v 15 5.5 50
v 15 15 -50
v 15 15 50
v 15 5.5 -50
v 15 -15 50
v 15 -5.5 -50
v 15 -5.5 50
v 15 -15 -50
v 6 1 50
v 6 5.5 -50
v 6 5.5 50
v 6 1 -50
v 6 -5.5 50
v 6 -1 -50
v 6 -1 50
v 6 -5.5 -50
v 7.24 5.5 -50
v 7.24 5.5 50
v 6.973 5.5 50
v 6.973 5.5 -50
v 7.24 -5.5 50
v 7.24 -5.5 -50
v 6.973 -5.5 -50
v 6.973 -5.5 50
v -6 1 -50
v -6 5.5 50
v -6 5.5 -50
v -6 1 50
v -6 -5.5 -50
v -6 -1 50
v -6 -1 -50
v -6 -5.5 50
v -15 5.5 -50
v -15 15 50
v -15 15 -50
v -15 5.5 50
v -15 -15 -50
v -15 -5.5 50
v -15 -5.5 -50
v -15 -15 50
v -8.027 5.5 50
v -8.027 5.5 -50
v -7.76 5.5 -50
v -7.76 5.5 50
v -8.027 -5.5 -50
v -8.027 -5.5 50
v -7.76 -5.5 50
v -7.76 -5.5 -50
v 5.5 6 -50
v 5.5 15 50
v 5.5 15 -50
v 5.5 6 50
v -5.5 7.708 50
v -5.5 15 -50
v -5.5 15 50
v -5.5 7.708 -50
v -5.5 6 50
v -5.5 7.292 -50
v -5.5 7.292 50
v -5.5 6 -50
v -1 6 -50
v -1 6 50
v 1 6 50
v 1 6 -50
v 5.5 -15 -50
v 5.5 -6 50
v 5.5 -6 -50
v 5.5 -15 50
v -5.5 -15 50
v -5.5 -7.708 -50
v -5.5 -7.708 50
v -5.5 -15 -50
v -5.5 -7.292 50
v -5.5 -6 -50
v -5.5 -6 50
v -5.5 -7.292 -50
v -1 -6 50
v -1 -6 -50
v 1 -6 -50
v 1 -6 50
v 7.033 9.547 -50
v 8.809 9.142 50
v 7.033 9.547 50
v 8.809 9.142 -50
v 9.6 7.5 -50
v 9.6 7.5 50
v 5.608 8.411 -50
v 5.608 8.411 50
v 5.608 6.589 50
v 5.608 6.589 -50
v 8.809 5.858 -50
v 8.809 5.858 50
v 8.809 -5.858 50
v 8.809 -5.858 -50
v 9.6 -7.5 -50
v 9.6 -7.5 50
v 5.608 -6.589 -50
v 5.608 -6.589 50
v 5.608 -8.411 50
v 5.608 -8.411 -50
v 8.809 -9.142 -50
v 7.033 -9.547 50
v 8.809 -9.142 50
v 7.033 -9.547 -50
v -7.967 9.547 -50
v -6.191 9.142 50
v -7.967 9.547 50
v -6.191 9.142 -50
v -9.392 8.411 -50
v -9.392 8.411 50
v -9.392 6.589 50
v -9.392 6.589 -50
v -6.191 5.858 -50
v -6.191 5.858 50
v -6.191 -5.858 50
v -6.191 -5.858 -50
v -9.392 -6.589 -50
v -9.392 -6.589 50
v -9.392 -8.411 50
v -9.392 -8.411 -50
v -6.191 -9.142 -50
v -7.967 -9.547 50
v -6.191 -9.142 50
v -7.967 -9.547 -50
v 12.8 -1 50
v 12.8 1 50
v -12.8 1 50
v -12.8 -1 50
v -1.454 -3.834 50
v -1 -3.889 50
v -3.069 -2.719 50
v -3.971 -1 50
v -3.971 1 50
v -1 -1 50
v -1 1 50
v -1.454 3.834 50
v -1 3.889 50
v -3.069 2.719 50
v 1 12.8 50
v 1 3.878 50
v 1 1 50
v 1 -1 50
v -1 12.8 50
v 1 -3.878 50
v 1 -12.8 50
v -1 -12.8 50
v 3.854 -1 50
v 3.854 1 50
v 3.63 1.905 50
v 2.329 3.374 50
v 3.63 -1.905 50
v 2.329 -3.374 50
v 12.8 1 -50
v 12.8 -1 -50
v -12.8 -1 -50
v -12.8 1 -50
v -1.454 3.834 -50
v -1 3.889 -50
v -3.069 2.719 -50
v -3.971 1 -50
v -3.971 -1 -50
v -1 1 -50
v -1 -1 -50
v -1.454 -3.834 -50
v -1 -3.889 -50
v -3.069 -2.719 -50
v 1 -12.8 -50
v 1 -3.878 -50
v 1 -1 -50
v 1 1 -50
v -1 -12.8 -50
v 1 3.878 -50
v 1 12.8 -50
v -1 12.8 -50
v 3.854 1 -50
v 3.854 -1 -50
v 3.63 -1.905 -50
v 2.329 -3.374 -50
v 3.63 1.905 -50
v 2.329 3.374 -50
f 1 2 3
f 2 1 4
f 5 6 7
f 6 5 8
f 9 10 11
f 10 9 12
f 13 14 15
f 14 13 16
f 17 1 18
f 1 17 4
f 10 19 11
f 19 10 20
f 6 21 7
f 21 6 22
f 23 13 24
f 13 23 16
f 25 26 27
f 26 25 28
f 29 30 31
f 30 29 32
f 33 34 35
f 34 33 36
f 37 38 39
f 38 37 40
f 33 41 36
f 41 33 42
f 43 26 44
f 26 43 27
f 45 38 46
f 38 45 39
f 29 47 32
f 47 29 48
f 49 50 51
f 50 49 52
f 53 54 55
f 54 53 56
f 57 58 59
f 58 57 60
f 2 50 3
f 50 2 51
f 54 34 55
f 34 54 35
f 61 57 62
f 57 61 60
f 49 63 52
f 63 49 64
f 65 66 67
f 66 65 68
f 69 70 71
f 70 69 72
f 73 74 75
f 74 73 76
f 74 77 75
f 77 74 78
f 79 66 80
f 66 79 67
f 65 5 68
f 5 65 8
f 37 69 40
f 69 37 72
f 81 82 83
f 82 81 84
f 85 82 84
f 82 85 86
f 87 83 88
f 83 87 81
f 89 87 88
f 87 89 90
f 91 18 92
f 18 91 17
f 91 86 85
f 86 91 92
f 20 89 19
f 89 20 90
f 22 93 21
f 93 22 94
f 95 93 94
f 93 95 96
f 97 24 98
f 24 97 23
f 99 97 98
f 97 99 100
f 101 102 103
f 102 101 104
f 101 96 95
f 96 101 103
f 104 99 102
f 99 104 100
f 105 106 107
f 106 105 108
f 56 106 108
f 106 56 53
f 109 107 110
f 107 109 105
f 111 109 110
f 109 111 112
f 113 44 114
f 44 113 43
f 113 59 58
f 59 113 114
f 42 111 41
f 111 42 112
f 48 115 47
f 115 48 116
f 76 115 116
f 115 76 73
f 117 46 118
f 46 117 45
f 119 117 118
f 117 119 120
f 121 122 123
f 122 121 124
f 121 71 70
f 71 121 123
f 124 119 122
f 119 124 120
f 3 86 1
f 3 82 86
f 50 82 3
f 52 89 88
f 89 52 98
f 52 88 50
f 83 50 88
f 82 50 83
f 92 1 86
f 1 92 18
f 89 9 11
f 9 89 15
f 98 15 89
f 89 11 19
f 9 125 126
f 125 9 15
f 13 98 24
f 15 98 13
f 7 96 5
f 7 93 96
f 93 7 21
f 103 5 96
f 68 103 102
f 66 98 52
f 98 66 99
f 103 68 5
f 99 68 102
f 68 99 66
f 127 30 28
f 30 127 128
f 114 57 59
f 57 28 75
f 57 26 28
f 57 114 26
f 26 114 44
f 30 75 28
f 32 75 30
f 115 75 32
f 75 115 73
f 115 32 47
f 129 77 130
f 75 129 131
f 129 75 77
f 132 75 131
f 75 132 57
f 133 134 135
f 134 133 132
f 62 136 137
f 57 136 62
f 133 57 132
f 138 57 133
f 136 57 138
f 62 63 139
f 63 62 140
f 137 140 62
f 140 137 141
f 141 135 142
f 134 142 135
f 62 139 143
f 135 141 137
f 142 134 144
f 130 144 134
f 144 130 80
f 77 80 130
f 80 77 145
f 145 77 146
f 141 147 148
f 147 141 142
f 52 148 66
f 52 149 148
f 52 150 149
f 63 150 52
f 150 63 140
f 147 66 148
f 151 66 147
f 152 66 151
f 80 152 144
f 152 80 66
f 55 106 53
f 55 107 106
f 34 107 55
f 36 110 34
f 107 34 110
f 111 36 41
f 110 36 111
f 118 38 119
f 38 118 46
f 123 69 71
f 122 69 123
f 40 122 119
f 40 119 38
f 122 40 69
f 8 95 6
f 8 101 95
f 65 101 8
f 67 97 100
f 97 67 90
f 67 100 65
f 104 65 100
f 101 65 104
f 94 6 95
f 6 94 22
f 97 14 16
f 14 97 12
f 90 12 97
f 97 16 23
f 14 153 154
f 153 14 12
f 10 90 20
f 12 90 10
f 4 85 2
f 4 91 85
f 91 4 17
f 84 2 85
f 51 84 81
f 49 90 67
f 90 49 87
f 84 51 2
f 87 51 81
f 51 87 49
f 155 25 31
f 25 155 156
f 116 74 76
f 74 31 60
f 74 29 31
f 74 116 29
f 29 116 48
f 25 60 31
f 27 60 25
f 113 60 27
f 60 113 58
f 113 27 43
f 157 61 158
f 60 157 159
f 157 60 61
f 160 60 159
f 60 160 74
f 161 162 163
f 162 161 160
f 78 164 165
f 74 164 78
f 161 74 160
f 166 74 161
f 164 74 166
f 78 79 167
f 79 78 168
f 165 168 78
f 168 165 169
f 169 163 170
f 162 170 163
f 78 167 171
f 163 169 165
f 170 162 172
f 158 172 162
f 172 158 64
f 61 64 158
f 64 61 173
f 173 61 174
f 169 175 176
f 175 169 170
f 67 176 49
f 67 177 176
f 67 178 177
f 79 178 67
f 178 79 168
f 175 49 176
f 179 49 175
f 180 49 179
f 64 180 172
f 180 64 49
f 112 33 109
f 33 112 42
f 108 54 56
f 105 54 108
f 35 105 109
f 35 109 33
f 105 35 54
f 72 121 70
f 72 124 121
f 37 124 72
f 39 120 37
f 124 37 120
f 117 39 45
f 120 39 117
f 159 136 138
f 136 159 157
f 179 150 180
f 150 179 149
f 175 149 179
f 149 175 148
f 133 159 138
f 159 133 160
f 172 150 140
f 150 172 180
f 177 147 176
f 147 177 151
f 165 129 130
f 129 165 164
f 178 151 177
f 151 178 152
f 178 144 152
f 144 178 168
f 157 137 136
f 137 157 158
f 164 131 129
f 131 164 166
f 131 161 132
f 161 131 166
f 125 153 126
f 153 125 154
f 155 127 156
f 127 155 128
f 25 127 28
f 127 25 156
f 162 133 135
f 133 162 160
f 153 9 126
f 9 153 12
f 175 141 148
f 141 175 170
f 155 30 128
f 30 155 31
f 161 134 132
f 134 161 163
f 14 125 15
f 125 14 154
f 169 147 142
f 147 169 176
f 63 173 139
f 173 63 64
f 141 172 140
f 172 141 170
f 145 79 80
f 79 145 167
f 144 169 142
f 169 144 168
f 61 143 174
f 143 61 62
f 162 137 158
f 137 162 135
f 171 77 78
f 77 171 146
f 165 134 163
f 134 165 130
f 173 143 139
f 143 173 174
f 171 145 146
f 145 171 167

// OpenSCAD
// Parameters
profile_width = 30; //[15:60:1]
profile_height = 30; //[15:60:1]
length = 100; //[50:200:1]
center = 1; //[0:1:1]
cornerHole = 1; //[0:1:1]
wall_thickness = 2.2; //[1.1:4.4:0.1]
slot_opening = 6.2; //[3.1:12.4:0.1]
slot_cavity_width = 11.0; //[5.5:22.0:0.1]
slot_depth = 8.0; //[4.0:16.0:0.1]
center_bore_diameter = 8.2; //[4.1:16.4:0.1]
web_thickness = 2.0; //[1.0:4.0:0.1]
corner_hole_diameter = 4.2; //[2.1:8.4:0.1]
corner_hole_inset = 7.5; //[3.75:15.0:0.1]
overlap = 1.0; //[0.5:2.0:0.1]

// Extrusion - complete detailed geometry
module extrusion() {
  color("Silver") {
    difference() {
      // Main body
      translate([0, 0, center*(0) + (1-center)*(length/2)])
        cube([profile_width, profile_height, length], center=true);
      
      // T-slot channels
      union() {
        translate([profile_width/2 - (slot_depth + overlap)/2, 0, center*(0) + (1-center)*(length/2)])
          cube([slot_depth + overlap, slot_cavity_width, length + 2*overlap], center=true);
        translate([-profile_width/2 + (slot_depth + overlap)/2, 0, center*(0) + (1-center)*(length/2)])
          cube([slot_depth + overlap, slot_cavity_width, length + 2*overlap], center=true);
        translate([0, profile_height/2 - (slot_depth + overlap)/2, center*(0) + (1-center)*(length/2)])
          cube([slot_cavity_width, slot_depth + overlap, length + 2*overlap], center=true);
        translate([0, -profile_height/2 + (slot_depth + overlap)/2, center*(0) + (1-center)*(length/2)])
          cube([slot_cavity_width, slot_depth + overlap, length + 2*overlap], center=true);
      }
      
      // T-slot mouths
      union() {
        translate([profile_width/2 - (slot_depth + overlap)/2, 0, center*(0) + (1-center)*(length/2)])
          cube([slot_depth + overlap, slot_opening, length + 2*overlap], center=true);
        translate([-profile_width/2 + (slot_depth + overlap)/2, 0, center*(0) + (1-center)*(length/2)])
          cube([slot_depth + overlap, slot_opening, length + 2*overlap], center=true);
        translate([0, profile_height/2 - (slot_depth + overlap)/2, center*(0) + (1-center)*(length/2)])
          cube([slot_opening, slot_depth + overlap, length + 2*overlap], center=true);
        translate([0, -profile_height/2 + (slot_depth + overlap)/2, center*(0) + (1-center)*(length/2)])
          cube([slot_opening, slot_depth + overlap, length + 2*overlap], center=true);
      }
      
      // Center bore
      translate([0, 0, center*(0) + (1-center)*(length/2)])
        cylinder(r=center_bore_diameter/2, h=length + 2*overlap, center=true);
      
      // Corner holes
      if (cornerHole) {
        union() {
          translate([profile_width/2 - corner_hole_inset, profile_height/2 - corner_hole_inset, center*(0) + (1-center)*(length/2)])
            cylinder(r=corner_hole_diameter/2, h=length + 2*overlap, center=true);
          translate([profile_width/2 - corner_hole_inset, -profile_height/2 + corner_hole_inset, center*(0) + (1-center)*(length/2)])
            cylinder(r=corner_hole_diameter/2, h=length + 2*overlap, center=true);
          translate([-profile_width/2 + corner_hole_inset, profile_height/2 - corner_hole_inset, center*(0) + (1-center)*(length/2)])
            cylinder(r=corner_hole_diameter/2, h=length + 2*overlap, center=true);
          translate([-profile_width/2 + corner_hole_inset, -profile_height/2 + corner_hole_inset, center*(0) + (1-center)*(length/2)])
            cylinder(r=corner_hole_diameter/2, h=length + 2*overlap, center=true);
        }
      }
    }
  }
}

// Extrusion Cross Section - complete detailed geometry
module extrusion_cross_section() {
  color("DimGray") {
    union() {
      // Internal webs
      translate([0, 0, center*(0) + (1-center)*(length/2)]) {
        cube([profile_width - 2*wall_thickness, web_thickness, length], center=true);
        cube([web_thickness, profile_height - 2*wall_thickness, length], center=true);
      }
    }
  }
}

// Box Corner Profile Section - complete detailed geometry
module box_corner_profile_section() {
  color("Black") {
    translate([profile_width/2 - wall_thickness/2, profile_height/2 - wall_thickness/2, center*(0) + (1-center)*(length/2)])
      cube([wall_thickness, wall_thickness, length], center=true);
  }
}

// Box Corner Profile Sections - complete detailed geometry
module box_corner_profile_sections() {
  color("Black") {
    union() {
      box_corner_profile_section();
      translate([-profile_width + wall_thickness, 0, 0]) box_corner_profile_section();
      translate([0, -profile_height + wall_thickness, 0]) box_corner_profile_section();
      translate([-profile_width + wall_thickness, -profile_height + wall_thickness, 0]) box_corner_profile_section();
    }
  }
}

// Assembly
module assembly() {
  extrusion();
  extrusion_cross_section();
  box_corner_profile_sections();
}

assembly();
